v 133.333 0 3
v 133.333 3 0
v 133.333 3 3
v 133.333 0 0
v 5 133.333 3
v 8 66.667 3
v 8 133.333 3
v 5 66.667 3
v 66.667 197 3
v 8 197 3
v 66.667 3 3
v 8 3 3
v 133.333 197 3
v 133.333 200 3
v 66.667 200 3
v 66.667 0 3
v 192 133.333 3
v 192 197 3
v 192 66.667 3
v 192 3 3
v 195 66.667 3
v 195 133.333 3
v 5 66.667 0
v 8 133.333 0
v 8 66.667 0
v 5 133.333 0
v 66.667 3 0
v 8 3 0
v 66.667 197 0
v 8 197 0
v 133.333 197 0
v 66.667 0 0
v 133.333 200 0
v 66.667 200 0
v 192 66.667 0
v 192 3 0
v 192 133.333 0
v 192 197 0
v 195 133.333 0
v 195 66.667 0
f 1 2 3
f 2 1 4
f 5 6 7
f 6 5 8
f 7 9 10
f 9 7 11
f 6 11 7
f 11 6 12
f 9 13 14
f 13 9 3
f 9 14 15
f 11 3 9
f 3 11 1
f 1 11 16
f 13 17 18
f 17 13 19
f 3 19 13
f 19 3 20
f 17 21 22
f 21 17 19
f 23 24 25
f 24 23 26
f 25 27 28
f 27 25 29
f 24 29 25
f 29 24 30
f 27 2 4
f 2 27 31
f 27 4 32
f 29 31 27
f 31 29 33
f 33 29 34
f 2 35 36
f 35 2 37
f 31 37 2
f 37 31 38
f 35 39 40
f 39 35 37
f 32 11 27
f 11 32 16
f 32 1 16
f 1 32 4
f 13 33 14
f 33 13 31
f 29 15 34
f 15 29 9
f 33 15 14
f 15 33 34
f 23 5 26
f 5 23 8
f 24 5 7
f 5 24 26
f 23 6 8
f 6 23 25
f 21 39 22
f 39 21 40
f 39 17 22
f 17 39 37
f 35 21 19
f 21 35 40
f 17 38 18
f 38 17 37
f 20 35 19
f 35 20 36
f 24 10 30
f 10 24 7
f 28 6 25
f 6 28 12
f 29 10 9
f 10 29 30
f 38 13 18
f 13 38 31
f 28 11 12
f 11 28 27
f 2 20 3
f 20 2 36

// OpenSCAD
// file: config.scad
$fn = 100;
nothing = 0.01;

// Material to cut from
material_z = 3;

// The inside measures of the box
cargo_x = 360;
cargo_y = 360;
cargo_z = 15;

// How much space to leave between nose cutouts and material corner
support_margin = 3;

// Resulting box measures
size_x = cargo_x + 2*material_z + 2*support_margin;
size_y = cargo_y + 2*material_z;
size_z = cargo_z + 0;

// Nose properties


// Snap joint properties



box_x = 200;
box_y = box_x;
box_z = 100;

top_inset_z = 5;
bottom_inset_z = 5;
side_y_inset = 5;

nose_width = box_x / 3;
nose_offset_x = box_x/2 - nose_width/2;
nose_offset_y = nose_offset_x;

/*
 * Snap parameters
 */
/*
snap_joint_width = 25;
snap_joint_height = 25;
snap_joint_feather_hook_height = 5;
*/

snap_joint_width = 60;
snap_joint_height = 40;
snap_joint_feather_width = 7;
snap_joint_feather_hook_width = 2;
snap_joint_feather_hook_height = 5;
snap_joint_feather_hook_cutaway = 3;
snap_joint_feather_base_height = 0.5;
snap_joint_stick_width = 10;

snap_joint_cutout_width = snap_joint_width + 2;


/*
 * Pintsch Bamag KNRW-220-G measures
 */
lamp_diameter = 165;
// [hole_x, hole_y hole_diameter]
lamp_holes = [
    // The big one
    [112.352, 93.705, 19],
    // The inner screw holes in counterclockwise order
    [82.735, 141.303, 6],
    [25.113, 51.206, 6],
    [131.988, 46.073, 6],
    // The outer screw holes in counterclockwise order
    [66.192, 142.490, 6],
    [32.613, 36.141, 6],
    [141.364, 59.746, 6]
    ];

lamp_offset_x = (box_x - lamp_diameter)/2;
lamp_offset_y = (box_y - lamp_diameter)/2;


/*
 * nRFduino coordinates (in side-x)
 */
nrfduino_offset_x = 45;
nrfduino_offset_z = 25;

/*
 * Relay coordinates (in side-x)
 */
relay_offset_x = 55;
relay_offset_z = 35;
// main file
include <config.scad>;

module side_xy()
{
    // Central plate
    translate([
        material_z + side_y_inset,
        material_z,
        0
        ])
    cube([
        box_x - 2*material_z - 2*side_y_inset,
        box_y - 2*material_z,
        material_z
        ]);

    // Add front and back edge noses
    for (y = [
                0,
                box_y - material_z - nothing
            ])
    {
        translate([
            nose_offset_x,
            y,
            0
            ])
        cube([
            nose_width,
            material_z + nothing,
            material_z
            ]);
    }

    // Add left and right edge noses
    for (x = [
            side_y_inset,
            box_x - side_y_inset - material_z - nothing
            ])
    {
        translate([
            x,
            nose_offset_y,
            0
            ])
        cube([
            material_z + nothing,
            nose_width,
            material_z
            ]);
    }
}

side_xy();
